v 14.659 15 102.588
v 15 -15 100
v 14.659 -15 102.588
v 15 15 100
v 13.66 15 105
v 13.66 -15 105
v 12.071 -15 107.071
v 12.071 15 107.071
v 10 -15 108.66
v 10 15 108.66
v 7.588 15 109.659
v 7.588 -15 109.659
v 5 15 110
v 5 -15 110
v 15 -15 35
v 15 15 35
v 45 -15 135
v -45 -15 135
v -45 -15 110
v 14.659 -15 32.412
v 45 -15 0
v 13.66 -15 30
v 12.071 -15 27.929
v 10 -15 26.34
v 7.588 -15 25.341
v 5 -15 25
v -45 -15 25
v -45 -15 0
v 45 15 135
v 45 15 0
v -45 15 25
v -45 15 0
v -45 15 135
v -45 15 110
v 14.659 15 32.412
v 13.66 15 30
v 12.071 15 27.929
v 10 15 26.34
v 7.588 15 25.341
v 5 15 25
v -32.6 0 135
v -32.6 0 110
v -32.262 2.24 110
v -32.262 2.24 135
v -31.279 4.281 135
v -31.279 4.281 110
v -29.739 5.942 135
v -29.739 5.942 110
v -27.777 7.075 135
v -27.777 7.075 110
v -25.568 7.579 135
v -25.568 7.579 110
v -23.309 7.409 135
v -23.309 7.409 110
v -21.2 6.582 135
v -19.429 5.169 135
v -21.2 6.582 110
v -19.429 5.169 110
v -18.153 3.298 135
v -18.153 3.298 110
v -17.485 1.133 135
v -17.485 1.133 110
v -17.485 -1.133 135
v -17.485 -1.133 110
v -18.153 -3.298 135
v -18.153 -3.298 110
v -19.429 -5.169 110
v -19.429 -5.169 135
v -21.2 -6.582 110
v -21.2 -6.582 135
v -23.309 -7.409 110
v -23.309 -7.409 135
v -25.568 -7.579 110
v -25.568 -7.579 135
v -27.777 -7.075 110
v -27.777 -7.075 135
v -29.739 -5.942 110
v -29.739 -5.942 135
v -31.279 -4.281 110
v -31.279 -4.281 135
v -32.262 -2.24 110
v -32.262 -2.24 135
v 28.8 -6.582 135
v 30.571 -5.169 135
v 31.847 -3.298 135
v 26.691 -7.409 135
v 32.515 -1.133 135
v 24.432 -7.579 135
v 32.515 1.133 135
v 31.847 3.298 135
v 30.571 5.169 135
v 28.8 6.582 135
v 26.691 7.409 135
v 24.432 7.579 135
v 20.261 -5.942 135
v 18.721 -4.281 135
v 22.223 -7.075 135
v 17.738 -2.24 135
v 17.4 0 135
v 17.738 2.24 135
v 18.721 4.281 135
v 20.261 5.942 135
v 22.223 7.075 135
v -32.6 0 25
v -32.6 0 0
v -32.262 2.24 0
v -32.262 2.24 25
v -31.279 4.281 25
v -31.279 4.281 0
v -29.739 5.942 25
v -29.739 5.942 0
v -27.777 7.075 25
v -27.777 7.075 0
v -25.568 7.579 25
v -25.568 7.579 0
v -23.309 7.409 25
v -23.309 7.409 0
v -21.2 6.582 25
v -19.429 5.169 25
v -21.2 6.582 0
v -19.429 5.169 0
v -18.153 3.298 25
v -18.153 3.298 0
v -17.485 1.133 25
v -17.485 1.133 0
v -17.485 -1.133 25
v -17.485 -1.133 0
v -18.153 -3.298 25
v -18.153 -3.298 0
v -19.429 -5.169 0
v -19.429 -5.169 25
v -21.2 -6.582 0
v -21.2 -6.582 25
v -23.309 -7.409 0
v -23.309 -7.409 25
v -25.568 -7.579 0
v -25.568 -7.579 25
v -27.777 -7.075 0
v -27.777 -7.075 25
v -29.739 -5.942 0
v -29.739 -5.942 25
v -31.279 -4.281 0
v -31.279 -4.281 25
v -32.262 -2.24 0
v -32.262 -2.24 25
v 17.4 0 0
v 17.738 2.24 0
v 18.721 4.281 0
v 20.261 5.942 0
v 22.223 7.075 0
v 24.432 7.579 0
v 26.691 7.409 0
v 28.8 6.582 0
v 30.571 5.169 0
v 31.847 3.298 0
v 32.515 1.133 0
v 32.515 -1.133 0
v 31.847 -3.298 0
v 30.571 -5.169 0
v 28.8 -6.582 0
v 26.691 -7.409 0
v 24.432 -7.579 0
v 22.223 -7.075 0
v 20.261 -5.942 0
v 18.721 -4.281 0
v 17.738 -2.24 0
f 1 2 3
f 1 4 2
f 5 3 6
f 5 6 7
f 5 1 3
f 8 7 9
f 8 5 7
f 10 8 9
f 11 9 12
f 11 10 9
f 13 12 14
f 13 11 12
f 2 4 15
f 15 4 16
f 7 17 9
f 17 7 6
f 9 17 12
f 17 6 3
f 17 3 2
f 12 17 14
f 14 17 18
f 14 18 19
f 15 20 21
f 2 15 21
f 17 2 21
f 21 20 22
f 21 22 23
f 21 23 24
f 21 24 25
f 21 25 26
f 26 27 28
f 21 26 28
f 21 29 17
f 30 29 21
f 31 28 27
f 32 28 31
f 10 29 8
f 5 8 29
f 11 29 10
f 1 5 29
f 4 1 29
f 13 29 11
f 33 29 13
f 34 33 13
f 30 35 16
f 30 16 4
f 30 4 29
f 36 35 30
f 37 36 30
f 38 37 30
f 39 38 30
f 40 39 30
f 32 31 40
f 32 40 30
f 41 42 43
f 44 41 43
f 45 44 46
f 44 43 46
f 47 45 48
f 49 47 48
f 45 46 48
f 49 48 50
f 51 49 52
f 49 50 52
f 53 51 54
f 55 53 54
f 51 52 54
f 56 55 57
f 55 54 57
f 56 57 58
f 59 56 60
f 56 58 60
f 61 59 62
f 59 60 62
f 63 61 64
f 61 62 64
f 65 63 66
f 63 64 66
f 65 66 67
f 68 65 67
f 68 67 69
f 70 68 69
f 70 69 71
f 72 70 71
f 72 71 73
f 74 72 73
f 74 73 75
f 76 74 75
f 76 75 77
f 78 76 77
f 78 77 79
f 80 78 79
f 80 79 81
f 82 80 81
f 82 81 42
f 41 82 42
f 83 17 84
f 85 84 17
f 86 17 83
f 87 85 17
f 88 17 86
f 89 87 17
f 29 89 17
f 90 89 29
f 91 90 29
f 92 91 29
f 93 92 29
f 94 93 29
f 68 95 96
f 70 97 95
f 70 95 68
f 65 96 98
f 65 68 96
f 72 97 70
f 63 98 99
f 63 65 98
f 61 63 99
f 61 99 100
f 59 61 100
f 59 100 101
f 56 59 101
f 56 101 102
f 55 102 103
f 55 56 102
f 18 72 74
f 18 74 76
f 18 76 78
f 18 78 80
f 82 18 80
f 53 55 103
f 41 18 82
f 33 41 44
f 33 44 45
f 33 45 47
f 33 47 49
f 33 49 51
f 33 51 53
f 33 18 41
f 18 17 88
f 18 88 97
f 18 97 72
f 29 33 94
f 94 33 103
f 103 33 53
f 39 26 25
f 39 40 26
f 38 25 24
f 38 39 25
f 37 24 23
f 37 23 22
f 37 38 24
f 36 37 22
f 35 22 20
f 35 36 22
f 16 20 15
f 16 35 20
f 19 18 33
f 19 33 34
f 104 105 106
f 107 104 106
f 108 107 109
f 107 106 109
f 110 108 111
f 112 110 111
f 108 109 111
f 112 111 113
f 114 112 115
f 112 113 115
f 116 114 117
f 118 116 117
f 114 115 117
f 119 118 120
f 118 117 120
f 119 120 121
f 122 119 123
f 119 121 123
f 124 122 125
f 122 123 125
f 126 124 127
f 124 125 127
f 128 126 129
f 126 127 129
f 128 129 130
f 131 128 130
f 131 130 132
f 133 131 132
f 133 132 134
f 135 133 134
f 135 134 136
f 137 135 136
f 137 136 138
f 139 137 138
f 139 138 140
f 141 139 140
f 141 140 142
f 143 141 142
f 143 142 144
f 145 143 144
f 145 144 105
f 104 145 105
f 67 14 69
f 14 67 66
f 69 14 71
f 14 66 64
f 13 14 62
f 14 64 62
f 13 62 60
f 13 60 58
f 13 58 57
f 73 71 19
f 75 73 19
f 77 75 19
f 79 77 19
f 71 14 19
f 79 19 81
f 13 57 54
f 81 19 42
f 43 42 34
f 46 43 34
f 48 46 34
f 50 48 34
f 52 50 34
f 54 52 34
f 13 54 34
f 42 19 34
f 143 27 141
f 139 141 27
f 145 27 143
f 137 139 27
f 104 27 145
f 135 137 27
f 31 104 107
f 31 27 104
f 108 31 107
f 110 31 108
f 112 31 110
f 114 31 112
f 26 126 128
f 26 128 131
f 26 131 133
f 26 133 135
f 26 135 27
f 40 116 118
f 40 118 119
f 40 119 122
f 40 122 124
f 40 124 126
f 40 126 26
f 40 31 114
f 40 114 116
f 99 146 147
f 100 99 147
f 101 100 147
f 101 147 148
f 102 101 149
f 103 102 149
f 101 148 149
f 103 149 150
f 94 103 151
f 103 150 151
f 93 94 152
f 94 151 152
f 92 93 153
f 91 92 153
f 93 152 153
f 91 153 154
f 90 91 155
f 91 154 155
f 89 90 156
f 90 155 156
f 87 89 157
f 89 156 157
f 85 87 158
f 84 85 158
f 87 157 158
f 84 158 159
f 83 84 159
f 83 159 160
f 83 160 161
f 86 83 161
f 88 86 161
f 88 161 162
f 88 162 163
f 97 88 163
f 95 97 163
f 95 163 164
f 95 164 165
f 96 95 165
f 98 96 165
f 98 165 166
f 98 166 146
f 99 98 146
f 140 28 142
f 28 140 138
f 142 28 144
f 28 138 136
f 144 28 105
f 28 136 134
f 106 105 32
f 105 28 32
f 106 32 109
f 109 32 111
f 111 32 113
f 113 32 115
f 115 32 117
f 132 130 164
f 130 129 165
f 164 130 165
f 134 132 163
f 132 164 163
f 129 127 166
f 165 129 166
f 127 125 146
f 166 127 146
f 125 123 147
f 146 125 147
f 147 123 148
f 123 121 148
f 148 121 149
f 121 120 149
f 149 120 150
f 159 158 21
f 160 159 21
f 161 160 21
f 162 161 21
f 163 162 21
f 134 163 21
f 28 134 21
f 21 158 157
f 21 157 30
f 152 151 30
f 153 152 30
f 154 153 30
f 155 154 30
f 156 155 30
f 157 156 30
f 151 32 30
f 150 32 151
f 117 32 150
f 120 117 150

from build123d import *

# Parameters (mm, degrees)
SKETCH1_W           = 90
SKETCH1_H           = 30
BOSS_EXTRUDE1_DEPTH = 25
SKETCH2_W           = 110
SKETCH2_H           = 30
BOSS_EXTRUDE2_DEPTH = 30
BOSS_EXTRUDE3_START = -90
SKETCH3_W           = 25
SKETCH3_H           = 30
BOSS_EXTRUDE3_DEPTH = 90
SKETCH4_R           = 7.6
CUT_EXTRUDE1_DEPTH  = 144.090880213
FILLET1_R           = 10


with BuildPart() as part:
    # Sketch1 → Boss-Extrude1 (new body)
    with BuildSketch(Plane.XY):
        Rectangle(SKETCH1_W, SKETCH1_H)
    extrude(amount=BOSS_EXTRUDE1_DEPTH)

    # Sketch2 → Boss-Extrude2 (add)
    with BuildSketch(Plane(origin=(45, 0, 0), x_dir=(0, 0, -1), z_dir=(1, 0, 0))):
        with Locations((-55, 0)):
            Rectangle(SKETCH2_W, SKETCH2_H)
    extrude(amount=-BOSS_EXTRUDE2_DEPTH)

    # Sketch3 → Boss-Extrude3 (add)
    with BuildSketch(Plane(origin=(45, 0, 0), x_dir=(0, 0, -1), z_dir=(1, 0, 0)).offset(BOSS_EXTRUDE3_START)):
        with Locations((-122.5, 0)):
            Rectangle(SKETCH3_W, SKETCH3_H)
    extrude(amount=BOSS_EXTRUDE3_DEPTH)

    # Sketch4 → Cut-Extrude1 (cut, through all)
    with BuildSketch(Plane(origin=(0, 0, 0), x_dir=(-1, 0, 0), z_dir=(0, 0, -1))):
        with Locations((25, 0)):
            Circle(SKETCH4_R)
        with Locations((-25, 0)):
            Circle(SKETCH4_R)
    extrude(amount=-CUT_EXTRUDE1_DEPTH, mode=Mode.SUBTRACT)

    # Fillet1
    fillet1_edges = [part.edges().sort_by_distance(p)[0] for p in [
        (15, 0, 25),
        (15, 0, 110),
    ]]
    fillet(fillet1_edges, radius=FILLET1_R)


solid = part.part
